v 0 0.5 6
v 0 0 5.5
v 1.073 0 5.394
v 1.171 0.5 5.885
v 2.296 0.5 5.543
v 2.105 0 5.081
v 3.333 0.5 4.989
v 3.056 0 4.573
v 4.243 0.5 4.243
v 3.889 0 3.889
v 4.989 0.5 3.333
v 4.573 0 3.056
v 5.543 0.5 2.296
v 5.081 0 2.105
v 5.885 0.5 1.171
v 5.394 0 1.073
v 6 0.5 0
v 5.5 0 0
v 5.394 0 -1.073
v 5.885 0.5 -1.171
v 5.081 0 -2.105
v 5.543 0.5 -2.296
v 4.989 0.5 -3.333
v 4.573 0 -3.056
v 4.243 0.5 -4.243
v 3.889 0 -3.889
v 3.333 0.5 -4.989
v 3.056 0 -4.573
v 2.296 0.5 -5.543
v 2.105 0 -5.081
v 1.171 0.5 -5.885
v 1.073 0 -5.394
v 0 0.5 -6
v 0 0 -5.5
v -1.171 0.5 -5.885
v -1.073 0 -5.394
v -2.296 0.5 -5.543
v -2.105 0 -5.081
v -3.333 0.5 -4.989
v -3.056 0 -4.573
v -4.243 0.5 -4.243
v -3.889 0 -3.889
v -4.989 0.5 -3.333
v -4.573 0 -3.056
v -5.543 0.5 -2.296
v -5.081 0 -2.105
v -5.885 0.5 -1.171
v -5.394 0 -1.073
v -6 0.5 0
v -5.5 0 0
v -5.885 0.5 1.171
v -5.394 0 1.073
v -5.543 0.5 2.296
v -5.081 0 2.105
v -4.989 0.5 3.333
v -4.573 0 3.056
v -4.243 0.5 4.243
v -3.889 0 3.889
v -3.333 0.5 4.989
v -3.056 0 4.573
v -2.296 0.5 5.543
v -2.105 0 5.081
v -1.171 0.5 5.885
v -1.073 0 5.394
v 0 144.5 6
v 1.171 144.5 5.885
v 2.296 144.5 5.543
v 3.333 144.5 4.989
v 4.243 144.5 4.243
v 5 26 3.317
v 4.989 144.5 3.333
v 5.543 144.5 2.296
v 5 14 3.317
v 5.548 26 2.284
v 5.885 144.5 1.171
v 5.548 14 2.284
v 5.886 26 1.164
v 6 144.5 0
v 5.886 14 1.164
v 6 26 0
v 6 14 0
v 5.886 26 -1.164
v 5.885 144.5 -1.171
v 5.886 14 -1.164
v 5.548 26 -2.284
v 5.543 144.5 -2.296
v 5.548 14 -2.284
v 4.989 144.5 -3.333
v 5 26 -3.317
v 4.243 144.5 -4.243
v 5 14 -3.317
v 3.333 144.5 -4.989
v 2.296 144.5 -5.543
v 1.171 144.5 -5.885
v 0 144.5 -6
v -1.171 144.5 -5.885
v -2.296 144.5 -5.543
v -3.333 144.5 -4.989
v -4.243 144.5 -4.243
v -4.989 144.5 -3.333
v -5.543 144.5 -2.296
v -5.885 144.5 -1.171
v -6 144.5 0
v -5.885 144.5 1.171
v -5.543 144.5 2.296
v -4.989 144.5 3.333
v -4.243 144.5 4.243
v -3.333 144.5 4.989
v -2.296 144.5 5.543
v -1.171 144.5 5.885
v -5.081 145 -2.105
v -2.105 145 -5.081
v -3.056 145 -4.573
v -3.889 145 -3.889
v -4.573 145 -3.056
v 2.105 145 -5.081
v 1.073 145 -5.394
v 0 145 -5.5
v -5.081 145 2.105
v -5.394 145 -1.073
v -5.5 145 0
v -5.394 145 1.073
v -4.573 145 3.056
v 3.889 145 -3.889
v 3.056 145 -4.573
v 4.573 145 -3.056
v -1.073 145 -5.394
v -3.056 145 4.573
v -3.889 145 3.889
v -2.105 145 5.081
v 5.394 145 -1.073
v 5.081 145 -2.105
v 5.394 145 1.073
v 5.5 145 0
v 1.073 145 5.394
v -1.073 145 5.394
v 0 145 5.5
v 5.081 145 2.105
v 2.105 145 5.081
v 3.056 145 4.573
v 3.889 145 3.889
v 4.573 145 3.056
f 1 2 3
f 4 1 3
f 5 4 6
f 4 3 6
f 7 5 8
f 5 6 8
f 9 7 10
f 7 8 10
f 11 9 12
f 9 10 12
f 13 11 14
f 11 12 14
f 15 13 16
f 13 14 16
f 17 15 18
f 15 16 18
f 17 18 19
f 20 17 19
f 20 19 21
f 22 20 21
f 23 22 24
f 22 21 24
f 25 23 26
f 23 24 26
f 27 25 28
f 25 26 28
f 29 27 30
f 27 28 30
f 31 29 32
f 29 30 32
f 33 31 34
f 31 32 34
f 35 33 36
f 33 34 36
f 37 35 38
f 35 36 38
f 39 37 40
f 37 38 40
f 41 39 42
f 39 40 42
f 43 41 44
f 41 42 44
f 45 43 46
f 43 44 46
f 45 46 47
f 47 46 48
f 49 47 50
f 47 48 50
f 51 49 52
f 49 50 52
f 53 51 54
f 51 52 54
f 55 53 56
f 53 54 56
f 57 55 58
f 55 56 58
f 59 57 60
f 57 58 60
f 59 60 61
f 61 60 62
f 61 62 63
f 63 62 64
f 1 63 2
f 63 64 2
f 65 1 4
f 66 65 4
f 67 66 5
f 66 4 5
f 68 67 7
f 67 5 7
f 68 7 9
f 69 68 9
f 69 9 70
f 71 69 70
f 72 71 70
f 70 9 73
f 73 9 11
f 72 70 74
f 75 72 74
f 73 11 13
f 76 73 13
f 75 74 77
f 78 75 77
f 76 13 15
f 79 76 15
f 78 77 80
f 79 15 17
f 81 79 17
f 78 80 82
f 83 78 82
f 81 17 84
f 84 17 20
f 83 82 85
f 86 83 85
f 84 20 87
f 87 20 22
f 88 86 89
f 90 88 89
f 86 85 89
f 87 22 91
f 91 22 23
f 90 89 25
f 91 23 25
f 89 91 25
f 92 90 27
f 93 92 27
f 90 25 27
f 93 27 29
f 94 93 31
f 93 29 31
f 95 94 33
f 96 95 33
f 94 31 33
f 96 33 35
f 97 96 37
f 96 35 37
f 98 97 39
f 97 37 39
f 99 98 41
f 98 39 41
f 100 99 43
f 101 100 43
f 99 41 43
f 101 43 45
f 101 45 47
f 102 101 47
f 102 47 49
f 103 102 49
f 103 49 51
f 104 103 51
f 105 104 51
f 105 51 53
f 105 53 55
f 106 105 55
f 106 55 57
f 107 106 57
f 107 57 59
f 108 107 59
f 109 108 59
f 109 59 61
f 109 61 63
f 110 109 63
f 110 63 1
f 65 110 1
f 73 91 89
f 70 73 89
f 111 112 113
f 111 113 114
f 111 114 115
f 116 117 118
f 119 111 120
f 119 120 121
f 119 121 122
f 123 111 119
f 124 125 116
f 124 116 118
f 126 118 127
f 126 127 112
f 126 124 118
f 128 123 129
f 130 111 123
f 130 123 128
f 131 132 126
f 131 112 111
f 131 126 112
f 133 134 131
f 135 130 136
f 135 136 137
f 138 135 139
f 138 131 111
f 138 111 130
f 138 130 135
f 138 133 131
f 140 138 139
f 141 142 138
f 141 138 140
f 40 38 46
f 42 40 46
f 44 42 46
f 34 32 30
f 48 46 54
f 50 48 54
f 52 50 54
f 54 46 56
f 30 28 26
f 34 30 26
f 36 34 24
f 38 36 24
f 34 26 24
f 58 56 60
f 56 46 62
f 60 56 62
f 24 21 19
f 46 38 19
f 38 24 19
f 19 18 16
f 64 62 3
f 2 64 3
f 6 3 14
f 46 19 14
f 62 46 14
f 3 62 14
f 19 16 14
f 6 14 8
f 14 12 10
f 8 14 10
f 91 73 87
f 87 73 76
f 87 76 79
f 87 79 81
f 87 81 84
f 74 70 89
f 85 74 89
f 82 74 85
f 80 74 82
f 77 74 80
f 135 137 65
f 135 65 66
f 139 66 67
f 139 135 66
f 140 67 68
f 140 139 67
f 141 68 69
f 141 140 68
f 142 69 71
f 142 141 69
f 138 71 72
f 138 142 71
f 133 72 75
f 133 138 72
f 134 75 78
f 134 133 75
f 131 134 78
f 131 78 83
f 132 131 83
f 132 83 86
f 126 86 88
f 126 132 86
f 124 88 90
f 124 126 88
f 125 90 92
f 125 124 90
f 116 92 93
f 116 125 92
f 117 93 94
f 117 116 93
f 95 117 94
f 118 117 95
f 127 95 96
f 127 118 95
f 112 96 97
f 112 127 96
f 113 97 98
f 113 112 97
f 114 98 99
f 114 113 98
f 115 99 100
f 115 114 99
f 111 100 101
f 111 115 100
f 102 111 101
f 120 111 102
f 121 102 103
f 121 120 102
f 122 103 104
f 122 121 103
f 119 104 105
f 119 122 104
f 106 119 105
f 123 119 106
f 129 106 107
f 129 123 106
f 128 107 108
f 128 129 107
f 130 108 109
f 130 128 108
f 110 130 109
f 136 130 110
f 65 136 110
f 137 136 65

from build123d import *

# Parameters (mm, degrees)
SKETCH1_R               = 6
BOSS_EXTRUDE1_DEPTH     = 145
CHAMFER1_SIZE           = 0.5
CUT_EXTRUDE1_DEPTH      = 146.24806367
CUT_EXTRUDE1_DEPTH_BACK = 146.24806367
SKETCH2_W               = 1
SKETCH2_H               = 12


with BuildPart() as part:
    # Sketch1 → Boss-Extrude1 (new body)
    with BuildSketch(Plane(origin=(0, 0, 0), x_dir=(1, 0, 0), z_dir=(0, 1, 0))):
        with Locations(Location((0, 0, 0), (0, 0, 270))):
            Circle(SKETCH1_R)
    extrude(amount=BOSS_EXTRUDE1_DEPTH)

    # Chamfer1
    chamfer1_edges = [part.edges().sort_by_distance(p)[0] for p in [
        (0, 0, -6),
        (0, 145, -6),
    ]]
    chamfer(chamfer1_edges, length=CHAMFER1_SIZE)

    # Sketch2 → Cut-Extrude1 (cut, two sides: drawn at the far end of the back side and taken through both)
    with BuildSketch(Plane.XY.offset(-CUT_EXTRUDE1_DEPTH_BACK)):
        with Locations((5.5, 20)):
            Rectangle(SKETCH2_W, SKETCH2_H)
    extrude(amount=CUT_EXTRUDE1_DEPTH + CUT_EXTRUDE1_DEPTH_BACK, mode=Mode.SUBTRACT)


solid = part.part
